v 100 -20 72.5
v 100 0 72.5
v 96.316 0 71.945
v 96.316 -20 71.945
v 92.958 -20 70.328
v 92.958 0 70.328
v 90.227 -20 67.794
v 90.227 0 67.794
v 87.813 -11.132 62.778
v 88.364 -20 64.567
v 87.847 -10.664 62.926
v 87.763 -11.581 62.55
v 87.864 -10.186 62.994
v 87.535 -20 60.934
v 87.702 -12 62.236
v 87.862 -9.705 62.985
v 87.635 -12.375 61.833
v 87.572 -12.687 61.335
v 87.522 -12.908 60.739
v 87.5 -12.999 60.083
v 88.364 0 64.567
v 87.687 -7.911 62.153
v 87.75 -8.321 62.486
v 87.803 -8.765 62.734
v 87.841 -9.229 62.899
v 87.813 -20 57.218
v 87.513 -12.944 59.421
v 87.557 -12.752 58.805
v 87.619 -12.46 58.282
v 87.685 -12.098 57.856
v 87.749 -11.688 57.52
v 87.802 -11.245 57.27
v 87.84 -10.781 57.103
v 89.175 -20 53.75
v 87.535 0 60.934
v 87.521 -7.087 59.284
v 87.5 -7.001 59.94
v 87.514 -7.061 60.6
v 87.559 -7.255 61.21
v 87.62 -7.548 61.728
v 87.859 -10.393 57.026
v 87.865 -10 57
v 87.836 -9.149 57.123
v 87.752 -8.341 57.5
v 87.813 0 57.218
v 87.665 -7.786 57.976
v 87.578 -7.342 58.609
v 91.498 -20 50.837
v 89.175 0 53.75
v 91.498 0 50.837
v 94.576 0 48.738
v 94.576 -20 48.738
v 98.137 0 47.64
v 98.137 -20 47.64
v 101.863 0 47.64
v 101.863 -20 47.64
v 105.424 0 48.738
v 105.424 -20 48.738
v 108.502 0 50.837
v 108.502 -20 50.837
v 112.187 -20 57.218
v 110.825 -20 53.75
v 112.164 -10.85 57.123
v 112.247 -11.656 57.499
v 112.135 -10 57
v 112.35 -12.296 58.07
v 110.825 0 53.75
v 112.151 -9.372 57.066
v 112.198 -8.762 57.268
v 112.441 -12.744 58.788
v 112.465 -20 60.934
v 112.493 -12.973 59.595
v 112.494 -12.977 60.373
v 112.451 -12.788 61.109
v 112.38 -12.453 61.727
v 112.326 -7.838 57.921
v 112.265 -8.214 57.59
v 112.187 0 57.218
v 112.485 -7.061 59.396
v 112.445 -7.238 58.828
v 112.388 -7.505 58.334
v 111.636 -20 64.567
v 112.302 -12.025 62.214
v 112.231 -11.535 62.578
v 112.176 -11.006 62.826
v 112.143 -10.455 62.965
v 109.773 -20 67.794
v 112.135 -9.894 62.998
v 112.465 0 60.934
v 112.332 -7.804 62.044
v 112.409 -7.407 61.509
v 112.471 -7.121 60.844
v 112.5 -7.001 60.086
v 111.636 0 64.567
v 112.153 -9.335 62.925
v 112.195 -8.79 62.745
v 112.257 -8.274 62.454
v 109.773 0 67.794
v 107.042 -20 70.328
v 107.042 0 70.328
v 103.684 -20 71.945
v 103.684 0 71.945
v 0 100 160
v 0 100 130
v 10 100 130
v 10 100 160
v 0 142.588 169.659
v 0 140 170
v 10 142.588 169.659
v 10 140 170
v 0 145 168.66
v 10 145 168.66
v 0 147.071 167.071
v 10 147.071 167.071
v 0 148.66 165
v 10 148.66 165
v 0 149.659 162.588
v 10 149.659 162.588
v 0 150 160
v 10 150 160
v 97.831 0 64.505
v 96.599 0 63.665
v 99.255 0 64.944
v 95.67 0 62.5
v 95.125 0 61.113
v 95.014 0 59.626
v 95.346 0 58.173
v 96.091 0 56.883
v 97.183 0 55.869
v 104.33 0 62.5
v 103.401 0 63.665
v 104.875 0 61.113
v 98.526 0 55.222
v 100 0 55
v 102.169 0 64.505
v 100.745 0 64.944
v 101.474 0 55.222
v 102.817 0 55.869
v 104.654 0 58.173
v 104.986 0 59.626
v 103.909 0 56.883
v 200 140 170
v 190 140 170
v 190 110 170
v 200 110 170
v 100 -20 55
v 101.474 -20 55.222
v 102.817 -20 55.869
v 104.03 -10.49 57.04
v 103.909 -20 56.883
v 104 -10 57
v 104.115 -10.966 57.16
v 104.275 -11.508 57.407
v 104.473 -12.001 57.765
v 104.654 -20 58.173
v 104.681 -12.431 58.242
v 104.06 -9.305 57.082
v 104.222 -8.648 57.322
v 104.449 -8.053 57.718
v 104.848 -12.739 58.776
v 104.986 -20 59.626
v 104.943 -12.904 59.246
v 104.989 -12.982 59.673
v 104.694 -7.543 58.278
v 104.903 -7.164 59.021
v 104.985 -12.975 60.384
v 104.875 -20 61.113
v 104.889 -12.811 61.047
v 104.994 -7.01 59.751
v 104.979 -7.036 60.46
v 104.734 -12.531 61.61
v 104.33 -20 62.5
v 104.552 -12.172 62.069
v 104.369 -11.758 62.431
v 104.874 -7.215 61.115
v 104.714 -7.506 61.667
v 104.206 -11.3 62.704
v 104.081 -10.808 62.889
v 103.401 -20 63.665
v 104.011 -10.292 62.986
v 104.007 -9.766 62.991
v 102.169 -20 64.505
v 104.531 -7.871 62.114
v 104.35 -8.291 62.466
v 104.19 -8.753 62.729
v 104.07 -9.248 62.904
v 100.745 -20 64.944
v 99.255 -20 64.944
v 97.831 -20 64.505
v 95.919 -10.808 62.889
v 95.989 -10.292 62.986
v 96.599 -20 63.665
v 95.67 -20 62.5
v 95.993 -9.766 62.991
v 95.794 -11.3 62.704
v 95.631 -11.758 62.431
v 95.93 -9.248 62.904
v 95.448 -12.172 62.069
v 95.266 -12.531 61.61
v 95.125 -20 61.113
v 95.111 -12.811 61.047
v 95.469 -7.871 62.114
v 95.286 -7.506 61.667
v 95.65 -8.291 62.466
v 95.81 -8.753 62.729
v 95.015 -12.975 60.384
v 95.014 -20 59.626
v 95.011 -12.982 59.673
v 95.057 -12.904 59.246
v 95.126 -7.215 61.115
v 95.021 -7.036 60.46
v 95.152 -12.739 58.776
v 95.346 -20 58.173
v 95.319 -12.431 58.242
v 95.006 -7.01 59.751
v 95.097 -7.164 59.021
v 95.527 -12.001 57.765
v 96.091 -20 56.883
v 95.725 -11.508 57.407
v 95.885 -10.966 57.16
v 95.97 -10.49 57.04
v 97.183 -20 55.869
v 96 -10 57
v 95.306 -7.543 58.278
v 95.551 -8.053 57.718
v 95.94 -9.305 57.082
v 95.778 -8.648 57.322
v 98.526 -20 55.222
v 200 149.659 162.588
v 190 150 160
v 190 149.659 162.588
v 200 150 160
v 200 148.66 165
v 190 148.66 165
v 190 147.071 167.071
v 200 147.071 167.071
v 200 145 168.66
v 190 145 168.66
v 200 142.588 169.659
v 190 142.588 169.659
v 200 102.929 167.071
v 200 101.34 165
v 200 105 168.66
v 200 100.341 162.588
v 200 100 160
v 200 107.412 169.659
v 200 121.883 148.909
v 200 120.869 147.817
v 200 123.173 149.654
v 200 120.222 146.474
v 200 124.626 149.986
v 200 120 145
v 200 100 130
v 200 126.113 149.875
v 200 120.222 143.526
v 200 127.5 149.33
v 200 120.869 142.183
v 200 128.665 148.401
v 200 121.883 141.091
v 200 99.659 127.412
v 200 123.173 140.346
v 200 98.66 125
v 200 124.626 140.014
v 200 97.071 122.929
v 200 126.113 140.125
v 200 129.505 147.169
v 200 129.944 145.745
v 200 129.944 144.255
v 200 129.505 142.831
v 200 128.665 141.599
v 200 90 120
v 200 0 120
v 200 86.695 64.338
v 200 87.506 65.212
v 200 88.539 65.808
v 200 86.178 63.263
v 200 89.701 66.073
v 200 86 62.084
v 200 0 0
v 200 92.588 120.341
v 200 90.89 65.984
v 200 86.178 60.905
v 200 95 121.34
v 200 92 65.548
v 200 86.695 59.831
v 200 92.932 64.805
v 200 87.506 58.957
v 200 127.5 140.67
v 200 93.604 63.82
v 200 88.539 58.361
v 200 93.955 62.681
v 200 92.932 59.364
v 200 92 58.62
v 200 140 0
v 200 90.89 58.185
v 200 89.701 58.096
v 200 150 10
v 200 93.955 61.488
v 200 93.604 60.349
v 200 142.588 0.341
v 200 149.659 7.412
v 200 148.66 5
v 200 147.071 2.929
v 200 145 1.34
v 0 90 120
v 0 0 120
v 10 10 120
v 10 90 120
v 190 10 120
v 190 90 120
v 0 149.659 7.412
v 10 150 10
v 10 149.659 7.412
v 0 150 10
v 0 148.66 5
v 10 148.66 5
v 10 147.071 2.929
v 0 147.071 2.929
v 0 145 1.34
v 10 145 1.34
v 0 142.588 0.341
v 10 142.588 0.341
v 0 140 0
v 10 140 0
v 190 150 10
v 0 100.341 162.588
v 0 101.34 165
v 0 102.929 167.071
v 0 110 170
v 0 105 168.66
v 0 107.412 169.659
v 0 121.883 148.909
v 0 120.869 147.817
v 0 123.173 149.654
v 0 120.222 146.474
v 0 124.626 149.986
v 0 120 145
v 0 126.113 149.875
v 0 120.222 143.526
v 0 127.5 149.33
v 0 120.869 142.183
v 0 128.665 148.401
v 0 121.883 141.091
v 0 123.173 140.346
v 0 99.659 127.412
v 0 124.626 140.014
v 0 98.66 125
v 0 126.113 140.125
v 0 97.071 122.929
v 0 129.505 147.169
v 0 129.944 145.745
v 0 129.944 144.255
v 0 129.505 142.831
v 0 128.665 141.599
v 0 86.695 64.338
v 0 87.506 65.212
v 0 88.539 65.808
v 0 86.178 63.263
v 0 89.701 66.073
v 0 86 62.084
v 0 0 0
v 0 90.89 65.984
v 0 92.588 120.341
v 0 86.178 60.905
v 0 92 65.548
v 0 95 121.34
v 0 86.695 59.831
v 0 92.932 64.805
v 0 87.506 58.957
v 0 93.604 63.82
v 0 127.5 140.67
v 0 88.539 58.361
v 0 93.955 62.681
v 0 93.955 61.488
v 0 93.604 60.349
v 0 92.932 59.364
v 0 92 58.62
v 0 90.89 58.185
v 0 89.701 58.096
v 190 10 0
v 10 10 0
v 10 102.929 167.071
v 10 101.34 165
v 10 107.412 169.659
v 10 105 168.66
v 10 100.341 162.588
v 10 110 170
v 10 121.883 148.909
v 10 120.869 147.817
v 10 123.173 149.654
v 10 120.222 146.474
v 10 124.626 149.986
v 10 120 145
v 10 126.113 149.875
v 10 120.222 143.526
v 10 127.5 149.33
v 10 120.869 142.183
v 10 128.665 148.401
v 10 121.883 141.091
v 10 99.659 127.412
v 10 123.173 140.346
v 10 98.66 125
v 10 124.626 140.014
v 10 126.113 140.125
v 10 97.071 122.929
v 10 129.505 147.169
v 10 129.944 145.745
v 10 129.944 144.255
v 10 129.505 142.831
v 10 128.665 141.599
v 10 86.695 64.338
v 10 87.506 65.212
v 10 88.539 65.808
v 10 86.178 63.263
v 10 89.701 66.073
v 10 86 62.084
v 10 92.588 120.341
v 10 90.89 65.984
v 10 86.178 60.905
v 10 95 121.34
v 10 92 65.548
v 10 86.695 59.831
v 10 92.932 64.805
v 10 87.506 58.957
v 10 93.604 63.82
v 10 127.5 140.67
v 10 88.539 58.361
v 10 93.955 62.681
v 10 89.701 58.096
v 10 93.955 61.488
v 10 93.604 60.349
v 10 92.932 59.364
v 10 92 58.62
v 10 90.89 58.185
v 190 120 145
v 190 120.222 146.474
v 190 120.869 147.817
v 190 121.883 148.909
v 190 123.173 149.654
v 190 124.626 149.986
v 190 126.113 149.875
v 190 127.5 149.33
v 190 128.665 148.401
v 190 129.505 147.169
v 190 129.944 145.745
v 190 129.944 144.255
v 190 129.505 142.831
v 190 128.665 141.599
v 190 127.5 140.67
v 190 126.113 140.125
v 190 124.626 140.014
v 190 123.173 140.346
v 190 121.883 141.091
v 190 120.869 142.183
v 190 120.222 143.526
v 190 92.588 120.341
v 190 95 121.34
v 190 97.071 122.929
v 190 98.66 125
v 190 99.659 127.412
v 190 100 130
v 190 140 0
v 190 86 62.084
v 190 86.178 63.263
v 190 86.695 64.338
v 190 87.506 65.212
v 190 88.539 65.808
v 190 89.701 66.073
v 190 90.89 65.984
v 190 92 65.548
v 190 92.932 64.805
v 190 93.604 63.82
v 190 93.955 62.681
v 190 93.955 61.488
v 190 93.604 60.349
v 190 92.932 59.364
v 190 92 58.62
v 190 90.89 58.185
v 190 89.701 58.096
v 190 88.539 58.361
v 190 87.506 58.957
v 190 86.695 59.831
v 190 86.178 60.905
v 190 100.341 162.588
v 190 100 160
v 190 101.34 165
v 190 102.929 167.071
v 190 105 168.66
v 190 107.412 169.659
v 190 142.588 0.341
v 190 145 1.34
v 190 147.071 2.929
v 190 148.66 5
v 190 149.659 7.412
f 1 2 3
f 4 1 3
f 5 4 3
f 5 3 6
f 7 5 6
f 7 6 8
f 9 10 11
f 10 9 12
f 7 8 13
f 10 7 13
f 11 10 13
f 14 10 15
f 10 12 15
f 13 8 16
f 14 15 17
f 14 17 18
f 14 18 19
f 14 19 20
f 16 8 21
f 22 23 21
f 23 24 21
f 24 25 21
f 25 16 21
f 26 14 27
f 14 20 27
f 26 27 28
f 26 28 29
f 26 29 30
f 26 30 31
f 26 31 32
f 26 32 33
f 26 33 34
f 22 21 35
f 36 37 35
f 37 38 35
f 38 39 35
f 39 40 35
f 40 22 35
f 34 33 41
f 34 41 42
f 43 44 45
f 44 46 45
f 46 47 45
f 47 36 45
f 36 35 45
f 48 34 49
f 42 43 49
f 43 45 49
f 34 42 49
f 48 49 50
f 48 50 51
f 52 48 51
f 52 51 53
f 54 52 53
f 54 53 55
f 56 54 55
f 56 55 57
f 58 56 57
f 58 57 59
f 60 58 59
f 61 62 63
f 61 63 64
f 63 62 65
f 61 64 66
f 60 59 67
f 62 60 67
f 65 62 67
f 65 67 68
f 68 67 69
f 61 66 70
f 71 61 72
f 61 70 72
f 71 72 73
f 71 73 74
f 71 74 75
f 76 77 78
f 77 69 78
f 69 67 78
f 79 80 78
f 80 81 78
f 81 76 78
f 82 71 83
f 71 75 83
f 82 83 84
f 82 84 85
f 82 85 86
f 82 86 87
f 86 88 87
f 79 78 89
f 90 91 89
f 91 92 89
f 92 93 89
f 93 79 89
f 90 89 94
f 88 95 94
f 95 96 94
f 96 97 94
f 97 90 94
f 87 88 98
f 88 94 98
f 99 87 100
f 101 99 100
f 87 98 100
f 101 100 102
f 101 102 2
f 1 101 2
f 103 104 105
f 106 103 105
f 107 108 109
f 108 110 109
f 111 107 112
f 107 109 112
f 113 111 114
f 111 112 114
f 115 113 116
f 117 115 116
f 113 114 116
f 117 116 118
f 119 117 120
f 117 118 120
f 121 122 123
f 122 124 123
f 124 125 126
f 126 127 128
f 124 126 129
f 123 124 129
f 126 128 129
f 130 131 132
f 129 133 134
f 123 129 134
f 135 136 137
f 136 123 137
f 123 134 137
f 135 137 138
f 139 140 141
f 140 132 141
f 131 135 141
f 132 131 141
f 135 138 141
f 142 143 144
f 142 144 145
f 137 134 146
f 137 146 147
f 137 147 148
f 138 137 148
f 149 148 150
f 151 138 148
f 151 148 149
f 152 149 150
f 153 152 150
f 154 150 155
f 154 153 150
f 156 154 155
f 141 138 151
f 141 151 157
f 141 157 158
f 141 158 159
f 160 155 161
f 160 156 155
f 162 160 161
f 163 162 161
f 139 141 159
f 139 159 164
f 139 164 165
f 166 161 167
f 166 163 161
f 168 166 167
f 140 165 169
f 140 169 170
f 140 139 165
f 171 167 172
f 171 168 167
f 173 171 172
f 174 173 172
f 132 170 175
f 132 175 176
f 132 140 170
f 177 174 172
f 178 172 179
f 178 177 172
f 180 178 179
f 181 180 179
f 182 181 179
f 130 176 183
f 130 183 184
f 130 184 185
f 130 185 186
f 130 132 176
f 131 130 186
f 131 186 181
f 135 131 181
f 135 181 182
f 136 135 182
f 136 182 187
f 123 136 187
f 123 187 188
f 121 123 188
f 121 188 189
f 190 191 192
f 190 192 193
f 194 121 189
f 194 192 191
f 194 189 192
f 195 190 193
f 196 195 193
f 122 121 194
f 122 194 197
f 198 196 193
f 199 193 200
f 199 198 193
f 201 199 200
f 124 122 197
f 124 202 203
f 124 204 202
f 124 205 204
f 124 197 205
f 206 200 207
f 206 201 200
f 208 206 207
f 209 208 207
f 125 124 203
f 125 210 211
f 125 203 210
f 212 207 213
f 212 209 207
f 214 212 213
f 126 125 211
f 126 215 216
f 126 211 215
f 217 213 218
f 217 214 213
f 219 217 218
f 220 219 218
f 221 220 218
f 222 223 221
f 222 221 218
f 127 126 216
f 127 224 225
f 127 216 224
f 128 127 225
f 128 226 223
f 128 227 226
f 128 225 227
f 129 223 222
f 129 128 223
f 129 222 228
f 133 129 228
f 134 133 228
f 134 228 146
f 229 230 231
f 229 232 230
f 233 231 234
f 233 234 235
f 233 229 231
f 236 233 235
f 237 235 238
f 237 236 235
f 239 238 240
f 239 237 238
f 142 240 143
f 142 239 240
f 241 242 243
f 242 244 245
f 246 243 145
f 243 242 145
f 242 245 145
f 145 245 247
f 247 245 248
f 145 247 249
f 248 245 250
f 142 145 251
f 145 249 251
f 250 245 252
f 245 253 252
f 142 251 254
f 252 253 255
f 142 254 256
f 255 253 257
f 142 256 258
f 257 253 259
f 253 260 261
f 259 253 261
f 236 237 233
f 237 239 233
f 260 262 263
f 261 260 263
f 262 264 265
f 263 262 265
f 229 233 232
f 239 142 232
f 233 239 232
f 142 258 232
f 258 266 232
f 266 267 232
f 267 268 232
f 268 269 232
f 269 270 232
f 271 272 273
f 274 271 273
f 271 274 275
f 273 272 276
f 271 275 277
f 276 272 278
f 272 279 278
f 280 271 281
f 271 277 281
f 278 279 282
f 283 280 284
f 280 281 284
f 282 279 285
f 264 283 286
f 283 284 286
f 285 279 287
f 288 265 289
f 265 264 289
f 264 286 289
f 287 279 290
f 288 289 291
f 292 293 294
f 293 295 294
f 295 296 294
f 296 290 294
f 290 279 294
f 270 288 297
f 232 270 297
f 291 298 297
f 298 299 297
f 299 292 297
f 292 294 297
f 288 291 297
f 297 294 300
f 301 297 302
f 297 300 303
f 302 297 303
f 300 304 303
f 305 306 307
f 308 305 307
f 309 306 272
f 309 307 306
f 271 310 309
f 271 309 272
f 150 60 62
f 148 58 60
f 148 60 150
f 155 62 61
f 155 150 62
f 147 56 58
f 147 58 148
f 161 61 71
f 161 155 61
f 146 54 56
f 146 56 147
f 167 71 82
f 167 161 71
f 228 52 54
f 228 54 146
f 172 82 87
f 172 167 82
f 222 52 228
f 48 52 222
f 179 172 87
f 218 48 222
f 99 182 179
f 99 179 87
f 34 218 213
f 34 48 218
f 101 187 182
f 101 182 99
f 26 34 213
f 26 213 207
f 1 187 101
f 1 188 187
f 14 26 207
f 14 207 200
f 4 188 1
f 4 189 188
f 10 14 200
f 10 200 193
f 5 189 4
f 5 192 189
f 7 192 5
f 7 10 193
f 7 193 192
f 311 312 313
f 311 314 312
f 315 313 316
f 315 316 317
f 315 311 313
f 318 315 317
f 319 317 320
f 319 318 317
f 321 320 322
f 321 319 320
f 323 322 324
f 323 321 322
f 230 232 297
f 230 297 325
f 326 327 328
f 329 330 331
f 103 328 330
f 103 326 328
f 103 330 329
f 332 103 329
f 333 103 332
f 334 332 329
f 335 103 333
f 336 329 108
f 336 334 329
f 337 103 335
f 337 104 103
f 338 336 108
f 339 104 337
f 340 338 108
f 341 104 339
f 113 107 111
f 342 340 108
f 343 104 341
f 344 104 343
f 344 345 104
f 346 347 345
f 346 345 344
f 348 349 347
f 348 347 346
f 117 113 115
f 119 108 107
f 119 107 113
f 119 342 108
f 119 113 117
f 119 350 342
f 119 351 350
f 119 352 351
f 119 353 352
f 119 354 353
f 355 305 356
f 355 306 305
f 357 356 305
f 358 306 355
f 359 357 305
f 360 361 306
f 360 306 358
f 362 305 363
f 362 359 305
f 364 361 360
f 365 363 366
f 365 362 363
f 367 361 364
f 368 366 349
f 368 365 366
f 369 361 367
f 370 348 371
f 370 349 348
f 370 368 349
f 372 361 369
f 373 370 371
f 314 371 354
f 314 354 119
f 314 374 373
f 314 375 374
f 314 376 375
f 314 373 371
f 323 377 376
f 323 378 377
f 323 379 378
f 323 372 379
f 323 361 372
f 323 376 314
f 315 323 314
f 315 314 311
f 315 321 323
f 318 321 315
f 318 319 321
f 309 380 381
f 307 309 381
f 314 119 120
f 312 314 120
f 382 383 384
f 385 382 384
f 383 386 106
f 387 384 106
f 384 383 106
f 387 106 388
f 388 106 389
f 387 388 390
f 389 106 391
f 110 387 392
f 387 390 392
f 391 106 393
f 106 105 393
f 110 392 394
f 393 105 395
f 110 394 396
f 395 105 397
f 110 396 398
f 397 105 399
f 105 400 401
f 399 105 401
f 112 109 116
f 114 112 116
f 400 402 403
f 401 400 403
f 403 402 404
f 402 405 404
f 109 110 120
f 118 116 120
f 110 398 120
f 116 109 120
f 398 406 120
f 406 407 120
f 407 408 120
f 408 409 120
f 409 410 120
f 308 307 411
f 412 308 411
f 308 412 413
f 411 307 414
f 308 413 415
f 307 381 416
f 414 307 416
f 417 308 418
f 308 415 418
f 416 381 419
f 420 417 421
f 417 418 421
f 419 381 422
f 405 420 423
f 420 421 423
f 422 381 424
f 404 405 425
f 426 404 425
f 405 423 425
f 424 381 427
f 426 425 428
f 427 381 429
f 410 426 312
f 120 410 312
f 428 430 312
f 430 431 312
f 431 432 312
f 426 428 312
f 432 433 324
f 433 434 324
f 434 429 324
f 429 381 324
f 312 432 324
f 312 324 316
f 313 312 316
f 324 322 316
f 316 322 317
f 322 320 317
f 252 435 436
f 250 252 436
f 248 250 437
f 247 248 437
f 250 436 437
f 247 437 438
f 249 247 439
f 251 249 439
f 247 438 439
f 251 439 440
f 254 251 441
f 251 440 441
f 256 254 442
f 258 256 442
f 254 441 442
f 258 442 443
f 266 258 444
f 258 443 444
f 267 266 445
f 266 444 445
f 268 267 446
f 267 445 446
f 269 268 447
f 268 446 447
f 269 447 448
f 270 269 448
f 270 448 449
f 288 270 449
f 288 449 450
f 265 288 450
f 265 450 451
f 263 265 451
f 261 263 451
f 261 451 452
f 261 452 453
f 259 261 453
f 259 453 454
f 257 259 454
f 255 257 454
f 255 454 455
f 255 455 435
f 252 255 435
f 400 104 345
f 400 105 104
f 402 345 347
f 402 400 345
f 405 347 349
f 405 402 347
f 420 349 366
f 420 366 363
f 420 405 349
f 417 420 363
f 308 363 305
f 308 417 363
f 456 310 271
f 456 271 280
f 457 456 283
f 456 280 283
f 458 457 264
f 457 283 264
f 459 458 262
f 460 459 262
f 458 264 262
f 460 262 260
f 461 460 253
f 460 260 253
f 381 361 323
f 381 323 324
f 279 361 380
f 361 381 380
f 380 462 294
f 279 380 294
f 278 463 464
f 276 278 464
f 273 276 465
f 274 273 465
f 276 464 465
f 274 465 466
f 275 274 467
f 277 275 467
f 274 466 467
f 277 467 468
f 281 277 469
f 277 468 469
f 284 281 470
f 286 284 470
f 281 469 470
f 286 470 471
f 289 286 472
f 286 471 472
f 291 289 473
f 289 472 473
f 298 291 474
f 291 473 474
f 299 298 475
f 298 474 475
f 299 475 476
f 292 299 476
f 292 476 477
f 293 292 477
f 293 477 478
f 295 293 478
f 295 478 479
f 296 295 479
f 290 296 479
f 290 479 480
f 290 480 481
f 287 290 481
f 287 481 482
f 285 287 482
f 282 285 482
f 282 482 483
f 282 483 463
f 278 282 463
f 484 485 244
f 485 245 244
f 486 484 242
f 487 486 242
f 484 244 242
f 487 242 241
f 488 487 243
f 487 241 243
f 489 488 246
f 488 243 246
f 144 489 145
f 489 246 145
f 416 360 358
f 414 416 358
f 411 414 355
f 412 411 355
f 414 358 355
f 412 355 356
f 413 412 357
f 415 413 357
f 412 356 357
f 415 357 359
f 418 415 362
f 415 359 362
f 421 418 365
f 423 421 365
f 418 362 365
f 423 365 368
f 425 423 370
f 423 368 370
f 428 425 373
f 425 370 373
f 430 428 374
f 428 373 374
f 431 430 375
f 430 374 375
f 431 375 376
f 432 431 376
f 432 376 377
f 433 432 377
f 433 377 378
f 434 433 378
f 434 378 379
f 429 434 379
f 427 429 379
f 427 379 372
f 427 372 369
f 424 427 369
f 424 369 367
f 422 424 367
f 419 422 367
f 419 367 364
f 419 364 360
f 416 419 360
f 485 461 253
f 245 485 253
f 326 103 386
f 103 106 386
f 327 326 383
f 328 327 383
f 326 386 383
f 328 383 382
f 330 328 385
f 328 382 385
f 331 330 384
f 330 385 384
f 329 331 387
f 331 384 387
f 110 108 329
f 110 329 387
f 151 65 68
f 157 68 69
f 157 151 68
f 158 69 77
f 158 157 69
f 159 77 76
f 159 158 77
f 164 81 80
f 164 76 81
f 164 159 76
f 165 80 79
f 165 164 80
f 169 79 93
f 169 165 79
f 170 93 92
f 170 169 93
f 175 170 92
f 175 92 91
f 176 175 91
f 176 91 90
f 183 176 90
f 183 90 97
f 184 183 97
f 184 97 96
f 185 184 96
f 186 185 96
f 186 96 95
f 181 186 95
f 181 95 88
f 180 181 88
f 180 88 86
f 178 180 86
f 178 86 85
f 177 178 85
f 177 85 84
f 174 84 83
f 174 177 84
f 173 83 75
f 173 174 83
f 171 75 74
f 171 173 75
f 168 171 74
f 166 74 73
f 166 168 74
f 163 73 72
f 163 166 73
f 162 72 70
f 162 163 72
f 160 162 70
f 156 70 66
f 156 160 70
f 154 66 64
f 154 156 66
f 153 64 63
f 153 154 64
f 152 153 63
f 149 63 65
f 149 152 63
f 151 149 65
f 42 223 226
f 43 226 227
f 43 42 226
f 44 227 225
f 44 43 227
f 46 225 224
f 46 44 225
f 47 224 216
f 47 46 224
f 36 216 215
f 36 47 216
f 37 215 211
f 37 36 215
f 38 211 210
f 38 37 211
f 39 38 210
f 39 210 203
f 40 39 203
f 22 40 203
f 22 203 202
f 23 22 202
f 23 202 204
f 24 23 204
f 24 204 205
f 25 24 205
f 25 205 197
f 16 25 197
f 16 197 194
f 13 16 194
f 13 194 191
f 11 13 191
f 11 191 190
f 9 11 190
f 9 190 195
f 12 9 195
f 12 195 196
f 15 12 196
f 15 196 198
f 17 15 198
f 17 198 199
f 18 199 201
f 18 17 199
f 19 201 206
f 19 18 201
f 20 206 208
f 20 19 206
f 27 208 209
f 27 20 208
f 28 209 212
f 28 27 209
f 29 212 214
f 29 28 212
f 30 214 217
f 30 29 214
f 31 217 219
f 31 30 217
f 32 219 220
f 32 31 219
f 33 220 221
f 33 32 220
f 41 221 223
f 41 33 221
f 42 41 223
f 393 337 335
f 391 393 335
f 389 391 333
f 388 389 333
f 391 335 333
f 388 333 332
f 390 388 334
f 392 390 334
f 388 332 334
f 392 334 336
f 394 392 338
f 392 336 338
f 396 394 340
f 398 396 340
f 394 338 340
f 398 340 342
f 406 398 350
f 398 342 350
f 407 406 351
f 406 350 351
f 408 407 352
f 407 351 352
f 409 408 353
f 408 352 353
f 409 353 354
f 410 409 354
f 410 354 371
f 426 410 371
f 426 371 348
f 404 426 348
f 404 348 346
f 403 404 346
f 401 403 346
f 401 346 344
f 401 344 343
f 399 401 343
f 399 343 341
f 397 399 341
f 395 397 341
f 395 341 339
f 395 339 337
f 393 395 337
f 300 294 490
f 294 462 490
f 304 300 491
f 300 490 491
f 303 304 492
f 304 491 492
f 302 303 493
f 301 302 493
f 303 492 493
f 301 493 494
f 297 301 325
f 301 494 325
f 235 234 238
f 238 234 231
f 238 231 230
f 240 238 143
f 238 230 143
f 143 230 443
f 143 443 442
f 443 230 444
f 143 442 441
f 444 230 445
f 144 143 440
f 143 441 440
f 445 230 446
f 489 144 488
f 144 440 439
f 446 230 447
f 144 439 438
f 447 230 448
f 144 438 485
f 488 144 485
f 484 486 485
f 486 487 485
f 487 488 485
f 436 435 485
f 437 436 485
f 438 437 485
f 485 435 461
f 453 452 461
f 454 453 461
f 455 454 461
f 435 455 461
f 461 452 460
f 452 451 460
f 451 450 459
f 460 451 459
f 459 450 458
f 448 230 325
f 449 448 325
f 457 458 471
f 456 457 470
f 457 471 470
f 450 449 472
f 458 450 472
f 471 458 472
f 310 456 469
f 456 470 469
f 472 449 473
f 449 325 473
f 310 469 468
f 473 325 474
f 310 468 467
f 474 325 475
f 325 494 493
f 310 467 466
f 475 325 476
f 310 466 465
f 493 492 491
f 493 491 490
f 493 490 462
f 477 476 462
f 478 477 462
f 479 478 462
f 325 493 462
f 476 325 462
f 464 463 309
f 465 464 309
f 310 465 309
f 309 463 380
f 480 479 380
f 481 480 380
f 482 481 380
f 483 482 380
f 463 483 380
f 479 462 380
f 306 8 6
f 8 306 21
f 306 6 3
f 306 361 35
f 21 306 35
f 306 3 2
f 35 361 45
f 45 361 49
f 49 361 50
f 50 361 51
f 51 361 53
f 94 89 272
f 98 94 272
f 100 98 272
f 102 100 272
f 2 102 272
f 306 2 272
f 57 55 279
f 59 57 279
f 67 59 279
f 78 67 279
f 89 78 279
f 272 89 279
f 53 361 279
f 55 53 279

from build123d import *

# Parameters (mm, degrees)
BOSS_EXTRUDE1_DEPTH     = 120
SKETCH2_W               = 10
SKETCH2_H               = 50
BOSS_EXTRUDE2_DEPTH     = 50
SKETCH3_R               = 5
CUT_EXTRUDE1_DEPTH      = 200
FILLET1_R               = 10
SKETCH5_R               = 4
CUT_EXTRUDE2_DEPTH      = 200
SKETCH6_R               = 12.5
SKETCH6_R_2             = 5
BOSS_EXTRUDE3_DEPTH     = 20
CUT_EXTRUDE3_DEPTH      = 12.5
CUT_EXTRUDE3_DEPTH_BACK = 12.5
CUT_EXTRUDE3_START      = 100
SKETCH7_R               = 3


with BuildPart() as part:
    # Sketch1 → Boss-Extrude1 (new body)
    with BuildSketch(Plane.XY):
        Polygon((0, 0), (200, 0), (200, 150), (190, 150), (190, 10), (10, 10), (10, 150), (0, 150), align=None)
    extrude(amount=BOSS_EXTRUDE1_DEPTH)

    # Sketch2 → Boss-Extrude2 (add)
    with BuildSketch(Plane.XY.offset(120)):
        with Locations((5, 125)):
            Rectangle(SKETCH2_W, SKETCH2_H)
        with Locations((195, 125)):
            Rectangle(SKETCH2_W, SKETCH2_H)
    extrude(amount=BOSS_EXTRUDE2_DEPTH)

    # Sketch3 → Cut-Extrude1 (cut)
    with BuildSketch(Plane.ZY):
        with Locations(Location((145, 125, 0), (0, 0, 270))):
            Circle(SKETCH3_R)
    extrude(amount=-CUT_EXTRUDE1_DEPTH, mode=Mode.SUBTRACT)

    # Fillet1
    fillet1_edges = [part.edges().sort_by_distance(p)[0] for p in [
        (195, 150, 0),
        (5, 100, 120),
        (5, 100, 170),
        (5, 150, 170),
        (195, 100, 120),
        (195, 100, 170),
        (195, 150, 170),
        (5, 150, 0),
    ]]
    fillet(fillet1_edges, radius=FILLET1_R)

    # Sketch5 → Cut-Extrude2 (cut)
    with BuildSketch(Plane.ZY):
        with Locations(Location((62.084380241, 90, 0), (0, 0, 270))):
            Circle(SKETCH5_R)
    extrude(amount=-CUT_EXTRUDE2_DEPTH, mode=Mode.SUBTRACT)

    # Sketch6 → Boss-Extrude3 (add)
    with BuildSketch(Plane.XZ):
        with Locations(Location((100, 60, 0), (0, 0, 90))):
            Circle(SKETCH6_R)
        with Locations(Location((100, 60, 0), (0, 0, 270))):
            Circle(SKETCH6_R_2, mode=Mode.SUBTRACT)
    extrude(amount=BOSS_EXTRUDE3_DEPTH)

    # Sketch7 → Cut-Extrude3 (cut, two sides: drawn at the far end of the back side and taken through both)
    with BuildSketch(Plane(origin=(0, 0, 0), x_dir=(0, 0, -1), z_dir=(1, 0, 0)).offset(CUT_EXTRUDE3_START - CUT_EXTRUDE3_DEPTH_BACK)):
        with Locations((-60, -10)):
            Circle(SKETCH7_R)
    extrude(amount=CUT_EXTRUDE3_DEPTH + CUT_EXTRUDE3_DEPTH_BACK, mode=Mode.SUBTRACT)


solid = part.part
